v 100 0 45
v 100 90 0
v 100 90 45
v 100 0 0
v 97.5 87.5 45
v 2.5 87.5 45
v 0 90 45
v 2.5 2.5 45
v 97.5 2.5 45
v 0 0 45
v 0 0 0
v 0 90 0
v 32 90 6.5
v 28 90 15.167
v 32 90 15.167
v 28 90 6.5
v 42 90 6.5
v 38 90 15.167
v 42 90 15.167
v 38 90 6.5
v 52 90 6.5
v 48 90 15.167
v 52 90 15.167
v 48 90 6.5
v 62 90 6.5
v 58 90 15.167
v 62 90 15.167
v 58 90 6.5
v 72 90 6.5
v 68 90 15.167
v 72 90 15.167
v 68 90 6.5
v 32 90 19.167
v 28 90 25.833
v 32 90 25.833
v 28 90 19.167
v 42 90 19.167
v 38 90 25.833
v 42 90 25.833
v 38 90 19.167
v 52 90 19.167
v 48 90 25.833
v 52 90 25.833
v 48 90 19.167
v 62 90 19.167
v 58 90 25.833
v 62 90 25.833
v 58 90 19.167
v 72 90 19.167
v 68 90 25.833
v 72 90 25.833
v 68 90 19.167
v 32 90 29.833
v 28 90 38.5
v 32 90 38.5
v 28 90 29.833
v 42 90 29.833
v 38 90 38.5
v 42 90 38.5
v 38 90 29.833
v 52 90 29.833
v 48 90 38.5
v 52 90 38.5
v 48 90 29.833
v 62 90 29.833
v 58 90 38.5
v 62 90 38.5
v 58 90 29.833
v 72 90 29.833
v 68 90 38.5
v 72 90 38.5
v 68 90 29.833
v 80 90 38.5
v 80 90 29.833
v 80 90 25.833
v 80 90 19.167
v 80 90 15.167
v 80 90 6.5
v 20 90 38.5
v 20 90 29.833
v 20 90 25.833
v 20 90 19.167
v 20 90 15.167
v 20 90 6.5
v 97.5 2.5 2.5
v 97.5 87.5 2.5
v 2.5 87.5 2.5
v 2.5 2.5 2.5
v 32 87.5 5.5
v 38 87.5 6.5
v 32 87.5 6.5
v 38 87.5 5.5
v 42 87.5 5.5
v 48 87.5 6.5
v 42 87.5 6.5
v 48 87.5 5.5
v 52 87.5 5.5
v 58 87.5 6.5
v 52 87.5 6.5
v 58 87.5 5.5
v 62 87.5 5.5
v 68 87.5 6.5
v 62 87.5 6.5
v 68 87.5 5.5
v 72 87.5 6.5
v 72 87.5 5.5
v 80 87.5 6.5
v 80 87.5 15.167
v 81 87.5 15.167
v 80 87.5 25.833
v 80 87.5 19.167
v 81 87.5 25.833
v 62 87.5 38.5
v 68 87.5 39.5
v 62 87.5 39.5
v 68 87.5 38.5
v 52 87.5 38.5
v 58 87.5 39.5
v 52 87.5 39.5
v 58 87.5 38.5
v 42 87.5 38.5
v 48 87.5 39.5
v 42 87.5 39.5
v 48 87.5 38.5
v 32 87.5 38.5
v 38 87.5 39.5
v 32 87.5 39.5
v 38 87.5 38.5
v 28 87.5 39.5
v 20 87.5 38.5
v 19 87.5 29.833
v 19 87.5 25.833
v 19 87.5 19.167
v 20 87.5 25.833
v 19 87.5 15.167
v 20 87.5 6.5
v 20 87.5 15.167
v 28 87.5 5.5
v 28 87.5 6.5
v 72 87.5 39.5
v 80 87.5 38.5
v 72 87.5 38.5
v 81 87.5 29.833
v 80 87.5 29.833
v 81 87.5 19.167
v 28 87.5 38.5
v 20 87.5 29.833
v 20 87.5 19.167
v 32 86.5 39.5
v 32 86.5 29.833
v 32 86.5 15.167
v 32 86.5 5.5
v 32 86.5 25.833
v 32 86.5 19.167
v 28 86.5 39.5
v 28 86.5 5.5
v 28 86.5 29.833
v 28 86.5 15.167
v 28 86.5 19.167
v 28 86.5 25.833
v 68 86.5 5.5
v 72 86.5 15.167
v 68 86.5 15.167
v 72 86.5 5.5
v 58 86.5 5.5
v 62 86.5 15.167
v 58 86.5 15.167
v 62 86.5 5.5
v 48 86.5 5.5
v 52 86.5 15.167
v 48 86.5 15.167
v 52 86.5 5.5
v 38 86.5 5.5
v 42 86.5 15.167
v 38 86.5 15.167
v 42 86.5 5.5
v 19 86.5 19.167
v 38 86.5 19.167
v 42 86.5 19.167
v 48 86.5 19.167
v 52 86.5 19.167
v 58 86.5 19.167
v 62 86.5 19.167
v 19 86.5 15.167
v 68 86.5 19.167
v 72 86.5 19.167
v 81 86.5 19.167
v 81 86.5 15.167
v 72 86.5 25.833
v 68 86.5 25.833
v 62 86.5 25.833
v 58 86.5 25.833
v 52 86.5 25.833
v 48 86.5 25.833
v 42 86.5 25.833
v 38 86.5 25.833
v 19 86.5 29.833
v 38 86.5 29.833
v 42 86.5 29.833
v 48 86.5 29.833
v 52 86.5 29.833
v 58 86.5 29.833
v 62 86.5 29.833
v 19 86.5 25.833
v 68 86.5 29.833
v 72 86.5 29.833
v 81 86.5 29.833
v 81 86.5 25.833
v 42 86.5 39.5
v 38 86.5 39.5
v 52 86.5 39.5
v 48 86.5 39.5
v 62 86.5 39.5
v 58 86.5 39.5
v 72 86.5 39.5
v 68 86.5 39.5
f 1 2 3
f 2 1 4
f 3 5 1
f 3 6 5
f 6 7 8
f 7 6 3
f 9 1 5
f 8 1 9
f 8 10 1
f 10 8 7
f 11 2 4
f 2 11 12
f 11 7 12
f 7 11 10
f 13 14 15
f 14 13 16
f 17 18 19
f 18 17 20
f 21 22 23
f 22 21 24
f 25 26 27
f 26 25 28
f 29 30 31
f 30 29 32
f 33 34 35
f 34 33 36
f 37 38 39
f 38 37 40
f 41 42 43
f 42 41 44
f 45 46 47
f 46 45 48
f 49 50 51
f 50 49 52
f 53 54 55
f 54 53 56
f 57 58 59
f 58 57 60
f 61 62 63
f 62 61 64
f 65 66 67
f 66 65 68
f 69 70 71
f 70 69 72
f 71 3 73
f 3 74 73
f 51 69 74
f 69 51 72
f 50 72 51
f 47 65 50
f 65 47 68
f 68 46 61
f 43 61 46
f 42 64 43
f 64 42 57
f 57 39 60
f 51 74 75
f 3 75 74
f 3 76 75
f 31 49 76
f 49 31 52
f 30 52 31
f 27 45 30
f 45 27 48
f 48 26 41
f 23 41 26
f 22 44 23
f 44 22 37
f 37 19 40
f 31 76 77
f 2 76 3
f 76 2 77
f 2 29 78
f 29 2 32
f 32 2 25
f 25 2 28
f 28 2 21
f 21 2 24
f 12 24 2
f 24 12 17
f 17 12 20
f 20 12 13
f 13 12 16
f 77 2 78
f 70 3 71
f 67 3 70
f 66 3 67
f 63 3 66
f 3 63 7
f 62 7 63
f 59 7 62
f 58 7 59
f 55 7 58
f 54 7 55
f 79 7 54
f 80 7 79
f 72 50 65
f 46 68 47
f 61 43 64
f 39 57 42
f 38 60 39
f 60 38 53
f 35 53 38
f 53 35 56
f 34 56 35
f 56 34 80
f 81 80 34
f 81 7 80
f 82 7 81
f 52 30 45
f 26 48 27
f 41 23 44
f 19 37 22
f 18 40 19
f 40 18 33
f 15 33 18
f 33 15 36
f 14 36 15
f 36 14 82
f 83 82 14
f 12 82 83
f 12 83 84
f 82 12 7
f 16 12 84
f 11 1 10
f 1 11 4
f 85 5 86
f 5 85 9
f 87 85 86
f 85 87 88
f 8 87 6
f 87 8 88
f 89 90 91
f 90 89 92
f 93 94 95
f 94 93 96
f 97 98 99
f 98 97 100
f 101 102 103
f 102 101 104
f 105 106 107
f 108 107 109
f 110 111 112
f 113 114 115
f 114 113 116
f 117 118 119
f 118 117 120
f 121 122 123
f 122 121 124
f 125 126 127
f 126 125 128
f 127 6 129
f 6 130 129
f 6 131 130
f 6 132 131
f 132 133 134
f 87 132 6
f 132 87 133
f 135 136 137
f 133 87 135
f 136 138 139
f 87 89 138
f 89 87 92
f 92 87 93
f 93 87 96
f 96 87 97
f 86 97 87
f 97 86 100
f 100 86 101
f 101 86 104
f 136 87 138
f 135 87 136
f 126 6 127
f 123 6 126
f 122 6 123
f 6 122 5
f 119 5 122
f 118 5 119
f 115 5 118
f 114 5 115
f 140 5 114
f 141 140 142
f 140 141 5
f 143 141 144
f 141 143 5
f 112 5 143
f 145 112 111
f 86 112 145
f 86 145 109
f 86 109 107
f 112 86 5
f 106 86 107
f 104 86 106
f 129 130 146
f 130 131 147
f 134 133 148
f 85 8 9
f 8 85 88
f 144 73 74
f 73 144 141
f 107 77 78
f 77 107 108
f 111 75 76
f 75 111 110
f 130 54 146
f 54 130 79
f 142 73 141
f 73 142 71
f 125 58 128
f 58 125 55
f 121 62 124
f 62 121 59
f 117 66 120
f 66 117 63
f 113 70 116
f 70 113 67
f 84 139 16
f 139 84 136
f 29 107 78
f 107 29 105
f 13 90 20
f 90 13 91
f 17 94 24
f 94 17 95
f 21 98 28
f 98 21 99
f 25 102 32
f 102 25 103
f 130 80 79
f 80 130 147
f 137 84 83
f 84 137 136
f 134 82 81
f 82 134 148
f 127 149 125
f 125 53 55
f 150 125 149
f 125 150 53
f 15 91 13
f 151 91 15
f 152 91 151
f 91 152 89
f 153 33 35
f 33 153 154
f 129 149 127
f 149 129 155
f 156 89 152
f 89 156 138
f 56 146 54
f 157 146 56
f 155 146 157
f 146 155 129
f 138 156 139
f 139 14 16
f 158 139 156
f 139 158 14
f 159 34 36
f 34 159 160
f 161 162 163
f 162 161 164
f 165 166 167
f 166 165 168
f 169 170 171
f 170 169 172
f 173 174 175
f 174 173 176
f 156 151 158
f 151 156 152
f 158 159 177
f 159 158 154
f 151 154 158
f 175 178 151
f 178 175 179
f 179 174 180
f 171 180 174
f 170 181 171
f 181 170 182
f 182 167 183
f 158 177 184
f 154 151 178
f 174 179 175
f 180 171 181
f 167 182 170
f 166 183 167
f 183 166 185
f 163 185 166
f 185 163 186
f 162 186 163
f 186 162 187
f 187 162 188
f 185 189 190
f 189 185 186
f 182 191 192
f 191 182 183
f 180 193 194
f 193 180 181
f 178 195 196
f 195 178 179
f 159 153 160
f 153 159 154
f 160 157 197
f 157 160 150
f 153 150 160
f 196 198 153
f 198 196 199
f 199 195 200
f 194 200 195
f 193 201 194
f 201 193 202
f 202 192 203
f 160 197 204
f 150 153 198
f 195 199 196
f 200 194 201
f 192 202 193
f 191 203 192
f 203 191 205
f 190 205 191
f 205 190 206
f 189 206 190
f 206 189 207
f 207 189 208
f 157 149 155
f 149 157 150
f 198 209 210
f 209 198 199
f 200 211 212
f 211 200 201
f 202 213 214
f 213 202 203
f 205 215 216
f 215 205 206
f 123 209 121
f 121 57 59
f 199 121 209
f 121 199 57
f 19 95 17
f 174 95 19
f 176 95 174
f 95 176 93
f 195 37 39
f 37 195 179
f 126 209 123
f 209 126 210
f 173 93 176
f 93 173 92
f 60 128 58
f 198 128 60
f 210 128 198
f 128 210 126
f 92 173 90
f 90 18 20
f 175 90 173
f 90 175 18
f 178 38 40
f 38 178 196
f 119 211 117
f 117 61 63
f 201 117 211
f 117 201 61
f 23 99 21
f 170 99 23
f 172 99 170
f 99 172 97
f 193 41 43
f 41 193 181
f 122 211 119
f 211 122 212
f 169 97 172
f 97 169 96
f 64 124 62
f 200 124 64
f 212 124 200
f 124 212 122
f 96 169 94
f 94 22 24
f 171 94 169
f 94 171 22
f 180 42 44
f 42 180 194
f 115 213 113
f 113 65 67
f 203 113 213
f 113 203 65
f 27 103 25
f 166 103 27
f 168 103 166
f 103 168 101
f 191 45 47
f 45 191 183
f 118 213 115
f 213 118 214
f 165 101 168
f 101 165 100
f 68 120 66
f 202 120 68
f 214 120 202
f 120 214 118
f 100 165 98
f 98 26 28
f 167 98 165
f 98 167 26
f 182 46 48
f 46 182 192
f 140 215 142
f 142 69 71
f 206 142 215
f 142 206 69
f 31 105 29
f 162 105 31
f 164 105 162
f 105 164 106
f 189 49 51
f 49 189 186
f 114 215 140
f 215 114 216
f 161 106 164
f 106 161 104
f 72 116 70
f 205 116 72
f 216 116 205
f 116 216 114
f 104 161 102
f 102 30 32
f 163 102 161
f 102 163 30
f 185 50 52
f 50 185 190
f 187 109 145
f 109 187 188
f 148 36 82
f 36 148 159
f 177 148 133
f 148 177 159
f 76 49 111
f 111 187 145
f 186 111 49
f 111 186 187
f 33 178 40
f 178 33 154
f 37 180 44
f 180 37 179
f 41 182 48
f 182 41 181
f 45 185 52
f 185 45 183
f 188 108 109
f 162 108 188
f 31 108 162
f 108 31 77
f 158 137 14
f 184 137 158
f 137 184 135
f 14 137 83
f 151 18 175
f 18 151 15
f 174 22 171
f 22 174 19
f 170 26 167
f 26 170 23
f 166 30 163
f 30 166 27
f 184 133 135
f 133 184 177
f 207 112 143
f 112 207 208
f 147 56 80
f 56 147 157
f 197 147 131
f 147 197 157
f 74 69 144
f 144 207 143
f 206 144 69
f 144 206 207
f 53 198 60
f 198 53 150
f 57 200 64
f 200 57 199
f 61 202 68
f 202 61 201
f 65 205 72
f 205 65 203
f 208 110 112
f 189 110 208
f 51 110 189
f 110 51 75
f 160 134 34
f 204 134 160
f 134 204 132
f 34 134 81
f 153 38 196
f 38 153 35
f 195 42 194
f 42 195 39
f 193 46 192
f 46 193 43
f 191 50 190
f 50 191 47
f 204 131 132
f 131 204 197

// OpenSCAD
$fn = 32;

// ----------------------------------------------------------------------
// Vent box: crossgrid enclosure
// ----------------------------------------------------------------------

// --- parameters (mm) ---
box_l = 100;              // box length, X
box_w = 90;               // box width, Y
box_h = 45;               // box height, Z
wall_t = 2.5;             // shell wall thickness
win_l = 60;               // vent window width, X
win_h = 32;               // vent window height, Z
bar_w = 4;                // grid bar width
n_v = 5;                  // vertical bar count
n_h = 2;                  // horizontal bar count

win_z0 = (box_h - win_h) / 2;  // window lower edge Z
v_step = win_l / (n_v + 1);  // vertical bar step
h_step = win_h / (n_h + 1);  // horizontal bar step

difference() {
  union() {
    difference() {
      cube([box_l, box_w, box_h]);
  translate([wall_t, wall_t, wall_t])
    cube([box_l - 2 * wall_t, box_w - 2 * wall_t, box_h]);
  translate([(box_l - win_l) / 2, box_w - wall_t - 1, win_z0])
    cube([win_l, wall_t + 2, win_h]);
    }
    for (i = [1 : n_v])
      translate([(box_l - win_l) / 2 + i * v_step - bar_w / 2,
                 box_w - wall_t - 1, win_z0 - 1])
        cube([bar_w, wall_t + 1, win_h + 2]);
    for (i = [1 : n_h])
      translate([(box_l - win_l) / 2 - 1, box_w - wall_t - 1,
                 win_z0 + i * h_step - bar_w / 2])
        cube([win_l + 2, wall_t + 1, bar_w]);
  }
}
